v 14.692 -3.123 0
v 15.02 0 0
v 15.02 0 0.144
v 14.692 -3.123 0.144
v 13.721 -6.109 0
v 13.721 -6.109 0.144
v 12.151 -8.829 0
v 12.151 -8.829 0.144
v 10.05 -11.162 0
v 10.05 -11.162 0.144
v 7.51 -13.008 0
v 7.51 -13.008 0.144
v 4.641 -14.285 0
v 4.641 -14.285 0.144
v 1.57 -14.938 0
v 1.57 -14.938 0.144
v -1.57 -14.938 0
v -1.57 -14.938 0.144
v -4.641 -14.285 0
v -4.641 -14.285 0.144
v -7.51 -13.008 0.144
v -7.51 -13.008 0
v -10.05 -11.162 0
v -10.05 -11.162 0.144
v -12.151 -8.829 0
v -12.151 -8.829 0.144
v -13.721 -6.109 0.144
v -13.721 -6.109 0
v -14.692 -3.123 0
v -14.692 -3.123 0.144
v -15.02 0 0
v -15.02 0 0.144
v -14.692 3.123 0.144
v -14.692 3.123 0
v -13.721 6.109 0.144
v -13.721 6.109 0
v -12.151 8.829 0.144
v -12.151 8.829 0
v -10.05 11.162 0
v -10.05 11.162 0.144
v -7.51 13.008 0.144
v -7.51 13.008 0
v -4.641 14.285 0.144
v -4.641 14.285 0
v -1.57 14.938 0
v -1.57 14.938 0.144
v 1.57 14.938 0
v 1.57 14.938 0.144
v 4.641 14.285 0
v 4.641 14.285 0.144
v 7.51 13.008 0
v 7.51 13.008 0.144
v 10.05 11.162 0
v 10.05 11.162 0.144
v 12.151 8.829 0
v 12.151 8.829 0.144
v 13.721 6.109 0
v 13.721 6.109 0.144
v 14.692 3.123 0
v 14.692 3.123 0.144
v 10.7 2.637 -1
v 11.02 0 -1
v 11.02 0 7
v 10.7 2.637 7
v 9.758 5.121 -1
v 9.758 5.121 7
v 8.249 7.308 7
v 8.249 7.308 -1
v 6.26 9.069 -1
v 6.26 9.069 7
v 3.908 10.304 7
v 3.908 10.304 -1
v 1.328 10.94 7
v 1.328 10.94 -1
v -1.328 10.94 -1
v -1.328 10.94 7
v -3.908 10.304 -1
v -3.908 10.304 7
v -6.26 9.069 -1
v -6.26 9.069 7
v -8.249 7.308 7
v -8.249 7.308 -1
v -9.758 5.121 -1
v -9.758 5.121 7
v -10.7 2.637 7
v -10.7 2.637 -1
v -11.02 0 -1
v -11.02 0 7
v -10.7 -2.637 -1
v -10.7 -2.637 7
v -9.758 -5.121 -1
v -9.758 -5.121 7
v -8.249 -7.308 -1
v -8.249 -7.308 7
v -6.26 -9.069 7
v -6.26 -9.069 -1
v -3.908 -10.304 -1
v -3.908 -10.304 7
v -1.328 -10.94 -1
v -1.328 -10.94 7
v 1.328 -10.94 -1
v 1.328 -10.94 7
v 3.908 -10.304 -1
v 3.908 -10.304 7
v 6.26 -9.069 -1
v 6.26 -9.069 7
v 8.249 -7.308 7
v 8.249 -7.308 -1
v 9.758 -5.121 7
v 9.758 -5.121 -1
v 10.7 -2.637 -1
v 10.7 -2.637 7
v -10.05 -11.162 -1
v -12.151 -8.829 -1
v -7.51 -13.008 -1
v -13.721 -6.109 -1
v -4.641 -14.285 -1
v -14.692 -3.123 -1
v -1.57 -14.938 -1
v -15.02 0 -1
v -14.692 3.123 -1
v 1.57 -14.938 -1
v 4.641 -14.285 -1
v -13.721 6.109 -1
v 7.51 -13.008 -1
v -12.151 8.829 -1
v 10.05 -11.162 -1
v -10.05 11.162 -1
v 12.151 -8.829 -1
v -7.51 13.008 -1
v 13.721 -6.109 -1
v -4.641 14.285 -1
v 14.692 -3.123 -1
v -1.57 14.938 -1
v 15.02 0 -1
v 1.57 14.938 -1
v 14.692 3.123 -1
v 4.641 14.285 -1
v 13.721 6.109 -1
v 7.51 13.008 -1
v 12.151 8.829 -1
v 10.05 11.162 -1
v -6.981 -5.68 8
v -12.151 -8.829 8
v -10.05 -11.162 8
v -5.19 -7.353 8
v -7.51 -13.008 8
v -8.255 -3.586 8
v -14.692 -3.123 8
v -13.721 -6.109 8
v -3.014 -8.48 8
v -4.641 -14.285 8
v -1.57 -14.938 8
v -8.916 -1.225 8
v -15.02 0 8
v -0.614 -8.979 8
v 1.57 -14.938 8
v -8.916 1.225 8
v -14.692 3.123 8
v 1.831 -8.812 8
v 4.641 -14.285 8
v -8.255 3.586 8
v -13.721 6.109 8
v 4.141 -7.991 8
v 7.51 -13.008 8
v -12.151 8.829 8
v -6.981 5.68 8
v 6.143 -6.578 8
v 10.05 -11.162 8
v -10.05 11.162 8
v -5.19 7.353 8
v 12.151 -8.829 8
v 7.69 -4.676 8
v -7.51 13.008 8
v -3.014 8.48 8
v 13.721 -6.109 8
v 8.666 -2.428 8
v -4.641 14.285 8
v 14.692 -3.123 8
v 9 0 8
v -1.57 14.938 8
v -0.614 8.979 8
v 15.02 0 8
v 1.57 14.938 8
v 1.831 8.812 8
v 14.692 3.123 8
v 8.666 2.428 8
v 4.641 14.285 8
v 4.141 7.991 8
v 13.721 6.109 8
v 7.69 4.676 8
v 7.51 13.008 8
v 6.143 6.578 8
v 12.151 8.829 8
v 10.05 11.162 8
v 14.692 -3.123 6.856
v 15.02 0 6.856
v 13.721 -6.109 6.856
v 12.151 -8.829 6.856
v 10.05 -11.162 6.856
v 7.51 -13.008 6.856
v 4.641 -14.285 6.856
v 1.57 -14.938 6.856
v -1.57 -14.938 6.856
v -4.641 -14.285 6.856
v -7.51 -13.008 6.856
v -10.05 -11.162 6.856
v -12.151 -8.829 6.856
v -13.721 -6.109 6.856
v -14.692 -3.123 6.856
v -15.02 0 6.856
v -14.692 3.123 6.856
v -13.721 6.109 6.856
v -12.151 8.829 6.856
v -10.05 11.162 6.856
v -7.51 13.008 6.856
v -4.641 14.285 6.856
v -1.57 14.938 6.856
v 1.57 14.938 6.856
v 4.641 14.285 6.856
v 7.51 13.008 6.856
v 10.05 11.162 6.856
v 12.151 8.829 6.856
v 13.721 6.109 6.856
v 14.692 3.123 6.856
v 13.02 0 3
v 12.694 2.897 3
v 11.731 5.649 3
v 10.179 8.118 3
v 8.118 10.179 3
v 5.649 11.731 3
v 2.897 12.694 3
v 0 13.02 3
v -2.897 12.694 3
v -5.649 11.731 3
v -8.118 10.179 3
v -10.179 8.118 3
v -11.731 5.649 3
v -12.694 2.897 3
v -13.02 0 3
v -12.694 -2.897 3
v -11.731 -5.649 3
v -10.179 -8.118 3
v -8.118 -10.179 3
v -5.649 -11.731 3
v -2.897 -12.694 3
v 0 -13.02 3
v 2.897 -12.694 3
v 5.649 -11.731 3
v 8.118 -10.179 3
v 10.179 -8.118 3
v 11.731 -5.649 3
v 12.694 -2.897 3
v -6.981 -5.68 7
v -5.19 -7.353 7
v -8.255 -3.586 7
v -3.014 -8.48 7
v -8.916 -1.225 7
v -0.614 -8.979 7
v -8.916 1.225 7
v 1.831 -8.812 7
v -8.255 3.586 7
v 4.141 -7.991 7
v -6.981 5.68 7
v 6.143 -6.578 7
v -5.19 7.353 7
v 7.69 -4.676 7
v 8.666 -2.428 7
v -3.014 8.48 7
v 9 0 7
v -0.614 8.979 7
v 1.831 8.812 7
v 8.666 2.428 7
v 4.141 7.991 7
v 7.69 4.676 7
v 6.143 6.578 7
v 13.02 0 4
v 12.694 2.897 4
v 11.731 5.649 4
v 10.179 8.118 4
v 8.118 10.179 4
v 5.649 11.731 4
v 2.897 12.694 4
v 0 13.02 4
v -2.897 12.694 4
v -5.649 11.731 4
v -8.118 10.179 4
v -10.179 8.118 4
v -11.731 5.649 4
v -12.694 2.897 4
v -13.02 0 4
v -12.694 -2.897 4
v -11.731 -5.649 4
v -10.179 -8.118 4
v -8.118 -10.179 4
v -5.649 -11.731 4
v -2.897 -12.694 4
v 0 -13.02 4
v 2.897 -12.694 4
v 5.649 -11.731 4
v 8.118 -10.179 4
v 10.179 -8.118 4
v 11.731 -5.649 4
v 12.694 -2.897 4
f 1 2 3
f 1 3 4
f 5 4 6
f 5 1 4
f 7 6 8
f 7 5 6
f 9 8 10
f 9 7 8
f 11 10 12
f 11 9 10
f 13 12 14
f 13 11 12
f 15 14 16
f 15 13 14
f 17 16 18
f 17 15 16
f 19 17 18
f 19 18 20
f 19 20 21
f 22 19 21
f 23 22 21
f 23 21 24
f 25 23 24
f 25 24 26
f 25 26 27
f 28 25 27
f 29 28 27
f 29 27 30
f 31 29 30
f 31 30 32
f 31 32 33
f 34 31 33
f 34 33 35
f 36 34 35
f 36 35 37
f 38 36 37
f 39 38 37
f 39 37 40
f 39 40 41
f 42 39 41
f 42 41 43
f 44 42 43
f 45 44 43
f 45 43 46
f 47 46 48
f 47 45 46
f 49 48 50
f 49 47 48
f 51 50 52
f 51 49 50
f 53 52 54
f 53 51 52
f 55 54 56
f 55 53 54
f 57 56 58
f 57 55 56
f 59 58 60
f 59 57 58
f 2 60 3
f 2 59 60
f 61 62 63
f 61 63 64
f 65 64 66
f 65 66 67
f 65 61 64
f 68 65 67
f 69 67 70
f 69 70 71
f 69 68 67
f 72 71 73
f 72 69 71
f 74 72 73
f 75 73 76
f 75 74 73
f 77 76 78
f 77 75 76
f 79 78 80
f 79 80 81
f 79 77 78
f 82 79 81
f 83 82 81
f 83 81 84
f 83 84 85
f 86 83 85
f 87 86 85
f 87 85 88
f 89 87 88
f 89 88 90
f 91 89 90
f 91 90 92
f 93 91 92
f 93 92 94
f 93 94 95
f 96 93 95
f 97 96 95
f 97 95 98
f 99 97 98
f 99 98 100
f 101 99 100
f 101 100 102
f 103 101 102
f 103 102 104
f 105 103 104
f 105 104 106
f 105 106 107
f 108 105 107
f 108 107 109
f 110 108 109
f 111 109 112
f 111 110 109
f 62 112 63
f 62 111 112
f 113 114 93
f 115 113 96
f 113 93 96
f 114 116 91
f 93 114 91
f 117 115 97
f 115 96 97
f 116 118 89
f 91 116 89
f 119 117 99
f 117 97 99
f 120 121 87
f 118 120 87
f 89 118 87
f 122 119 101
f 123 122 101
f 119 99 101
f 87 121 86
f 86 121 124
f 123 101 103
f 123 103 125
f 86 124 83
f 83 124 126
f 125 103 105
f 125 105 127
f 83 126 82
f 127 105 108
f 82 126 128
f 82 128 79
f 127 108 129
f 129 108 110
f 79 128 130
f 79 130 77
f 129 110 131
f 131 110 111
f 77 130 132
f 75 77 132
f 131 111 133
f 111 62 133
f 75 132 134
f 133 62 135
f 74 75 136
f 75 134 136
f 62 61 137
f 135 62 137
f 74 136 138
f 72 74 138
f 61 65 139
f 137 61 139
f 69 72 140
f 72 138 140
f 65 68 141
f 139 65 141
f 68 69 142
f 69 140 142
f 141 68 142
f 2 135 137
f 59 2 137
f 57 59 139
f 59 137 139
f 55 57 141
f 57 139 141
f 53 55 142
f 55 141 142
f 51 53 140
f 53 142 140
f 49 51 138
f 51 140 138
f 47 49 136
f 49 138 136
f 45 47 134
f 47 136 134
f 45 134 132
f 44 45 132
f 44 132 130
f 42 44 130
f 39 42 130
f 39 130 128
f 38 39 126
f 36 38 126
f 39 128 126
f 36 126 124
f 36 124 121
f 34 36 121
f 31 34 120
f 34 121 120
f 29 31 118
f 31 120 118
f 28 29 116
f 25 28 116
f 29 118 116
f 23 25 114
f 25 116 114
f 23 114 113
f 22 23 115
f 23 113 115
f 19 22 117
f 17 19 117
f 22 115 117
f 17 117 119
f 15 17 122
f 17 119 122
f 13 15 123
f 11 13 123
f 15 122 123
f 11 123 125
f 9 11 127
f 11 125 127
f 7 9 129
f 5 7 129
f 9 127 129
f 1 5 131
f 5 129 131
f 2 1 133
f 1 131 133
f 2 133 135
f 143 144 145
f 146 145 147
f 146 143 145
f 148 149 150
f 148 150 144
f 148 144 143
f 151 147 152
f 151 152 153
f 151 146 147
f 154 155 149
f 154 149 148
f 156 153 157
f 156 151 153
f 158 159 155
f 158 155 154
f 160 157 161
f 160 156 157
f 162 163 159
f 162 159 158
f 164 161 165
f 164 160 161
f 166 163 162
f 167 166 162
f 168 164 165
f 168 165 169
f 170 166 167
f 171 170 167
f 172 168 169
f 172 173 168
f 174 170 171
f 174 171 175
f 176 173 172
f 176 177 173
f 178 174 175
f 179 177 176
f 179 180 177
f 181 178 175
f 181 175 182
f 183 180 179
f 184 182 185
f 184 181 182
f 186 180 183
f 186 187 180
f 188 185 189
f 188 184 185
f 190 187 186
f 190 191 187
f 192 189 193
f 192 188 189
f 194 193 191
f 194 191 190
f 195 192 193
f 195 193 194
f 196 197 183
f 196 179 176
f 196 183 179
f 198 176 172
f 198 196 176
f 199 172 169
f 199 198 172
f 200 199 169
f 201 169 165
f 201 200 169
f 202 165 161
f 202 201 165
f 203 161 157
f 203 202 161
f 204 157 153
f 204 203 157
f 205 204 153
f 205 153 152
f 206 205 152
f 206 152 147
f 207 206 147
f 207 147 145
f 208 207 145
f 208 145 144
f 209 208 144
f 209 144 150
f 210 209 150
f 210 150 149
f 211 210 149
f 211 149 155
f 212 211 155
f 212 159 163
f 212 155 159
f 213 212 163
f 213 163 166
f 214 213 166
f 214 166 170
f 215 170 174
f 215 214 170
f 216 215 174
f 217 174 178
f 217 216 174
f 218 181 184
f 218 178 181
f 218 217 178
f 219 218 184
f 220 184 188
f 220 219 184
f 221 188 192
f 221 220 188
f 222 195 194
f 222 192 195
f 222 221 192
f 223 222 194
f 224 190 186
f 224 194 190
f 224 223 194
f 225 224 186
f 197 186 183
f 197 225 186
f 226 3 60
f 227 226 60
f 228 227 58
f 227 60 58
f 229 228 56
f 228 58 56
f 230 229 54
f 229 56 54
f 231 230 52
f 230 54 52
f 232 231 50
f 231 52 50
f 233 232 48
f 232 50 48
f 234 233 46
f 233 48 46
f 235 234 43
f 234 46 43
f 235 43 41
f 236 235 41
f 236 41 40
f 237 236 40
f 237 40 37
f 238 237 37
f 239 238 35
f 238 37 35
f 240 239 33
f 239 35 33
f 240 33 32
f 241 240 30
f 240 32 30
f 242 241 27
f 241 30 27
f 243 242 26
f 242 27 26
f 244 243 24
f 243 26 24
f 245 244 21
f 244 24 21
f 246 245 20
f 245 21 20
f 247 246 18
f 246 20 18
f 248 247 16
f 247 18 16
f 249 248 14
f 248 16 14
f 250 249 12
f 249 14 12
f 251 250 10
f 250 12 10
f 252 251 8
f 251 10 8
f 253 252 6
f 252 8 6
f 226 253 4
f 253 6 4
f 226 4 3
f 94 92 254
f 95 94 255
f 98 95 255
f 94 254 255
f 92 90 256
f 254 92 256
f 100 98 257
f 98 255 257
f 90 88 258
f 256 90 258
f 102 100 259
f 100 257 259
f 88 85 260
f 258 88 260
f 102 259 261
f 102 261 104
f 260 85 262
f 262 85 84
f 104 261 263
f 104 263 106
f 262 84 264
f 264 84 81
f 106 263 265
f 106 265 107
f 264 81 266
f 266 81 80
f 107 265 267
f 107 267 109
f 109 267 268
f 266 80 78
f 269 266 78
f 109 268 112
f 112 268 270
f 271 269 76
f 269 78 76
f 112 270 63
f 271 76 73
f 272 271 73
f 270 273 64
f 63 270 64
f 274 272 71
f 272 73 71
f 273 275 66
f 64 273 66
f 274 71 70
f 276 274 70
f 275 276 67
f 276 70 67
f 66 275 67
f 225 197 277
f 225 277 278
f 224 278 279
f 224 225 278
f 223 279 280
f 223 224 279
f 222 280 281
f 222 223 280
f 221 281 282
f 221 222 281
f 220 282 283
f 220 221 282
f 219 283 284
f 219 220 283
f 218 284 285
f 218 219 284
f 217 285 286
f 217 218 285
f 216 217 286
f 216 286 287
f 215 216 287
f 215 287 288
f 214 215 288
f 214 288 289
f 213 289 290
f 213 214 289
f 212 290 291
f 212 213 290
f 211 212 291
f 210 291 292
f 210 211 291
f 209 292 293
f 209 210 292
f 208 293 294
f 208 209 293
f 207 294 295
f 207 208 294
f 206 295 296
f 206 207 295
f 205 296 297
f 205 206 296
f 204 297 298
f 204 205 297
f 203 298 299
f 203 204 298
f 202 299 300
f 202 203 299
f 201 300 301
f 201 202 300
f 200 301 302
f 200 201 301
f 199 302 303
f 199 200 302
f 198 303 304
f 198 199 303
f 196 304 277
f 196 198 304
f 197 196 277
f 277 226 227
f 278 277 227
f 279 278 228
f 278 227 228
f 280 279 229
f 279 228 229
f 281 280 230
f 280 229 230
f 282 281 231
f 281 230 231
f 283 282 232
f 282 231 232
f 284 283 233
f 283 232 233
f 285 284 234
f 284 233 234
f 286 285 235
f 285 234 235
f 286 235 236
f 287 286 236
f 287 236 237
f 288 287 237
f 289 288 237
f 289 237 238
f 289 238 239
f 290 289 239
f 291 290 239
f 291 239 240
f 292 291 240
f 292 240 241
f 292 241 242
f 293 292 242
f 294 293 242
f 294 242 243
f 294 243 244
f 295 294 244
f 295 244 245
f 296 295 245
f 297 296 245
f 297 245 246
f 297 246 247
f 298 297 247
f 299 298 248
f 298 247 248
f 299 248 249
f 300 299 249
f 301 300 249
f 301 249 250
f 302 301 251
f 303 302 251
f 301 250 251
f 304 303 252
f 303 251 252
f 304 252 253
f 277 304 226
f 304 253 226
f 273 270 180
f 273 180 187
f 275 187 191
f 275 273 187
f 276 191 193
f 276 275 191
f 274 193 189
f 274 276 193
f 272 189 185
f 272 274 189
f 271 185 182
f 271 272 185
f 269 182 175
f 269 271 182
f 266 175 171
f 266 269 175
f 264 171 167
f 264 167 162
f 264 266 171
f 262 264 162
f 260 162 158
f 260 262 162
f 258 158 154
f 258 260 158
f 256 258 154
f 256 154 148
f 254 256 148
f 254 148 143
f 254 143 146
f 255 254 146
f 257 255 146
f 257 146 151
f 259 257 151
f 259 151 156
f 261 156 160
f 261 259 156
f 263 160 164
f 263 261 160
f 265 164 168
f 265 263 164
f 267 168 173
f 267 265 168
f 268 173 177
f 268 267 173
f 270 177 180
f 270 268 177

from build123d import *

# Parameters (mm, degrees)
SKETCH2_R               = 13.02
SKETCH2_R_2             = 11.02
BOSS_EXTRUDE1_DEPTH     = 7
SKETCH3_R               = 15.02
SKETCH3_R_2             = 13.02
SKETCH3_R_3             = 11.02
SKETCH3_R_4             = 9
BOSS_EXTRUDE2_DEPTH     = 1
SALIENTE_EXTRUIR1_START = -8
SKETCH3_2_R             = 15.02
SKETCH3_2_R_2           = 13.02
SKETCH3_2_R_3           = 11.02
SALIENTE_EXTRUIR1_DEPTH = 1
CHAFL_N1_SIZE           = 3
CHAFL_N1_SIZE_2         = 2.100622615
CHAMFER1_SIZE           = 3
CHAMFER1_SIZE_2         = 2.100622615


with BuildPart() as part:
    # Sketch2 → Boss-Extrude1 (new body)
    with BuildSketch(Plane.XY):
        Circle(SKETCH2_R)
        Circle(SKETCH2_R_2, mode=Mode.SUBTRACT)
    extrude(amount=BOSS_EXTRUDE1_DEPTH)

    # Sketch3 → Boss-Extrude2 (add)
    # profile 1 of 3: a face of its own
    with BuildSketch(Plane.XY.offset(7)):
        Circle(SKETCH3_R)
        Circle(SKETCH3_R_2, mode=Mode.SUBTRACT)
    # profile 2 of 3: a face of its own
    with BuildSketch(Plane.XY.offset(7)):
        Circle(SKETCH3_R_2)
        Circle(SKETCH3_R_3, mode=Mode.SUBTRACT)
    # profile 3 of 3: a face of its own
    with BuildSketch(Plane.XY.offset(7)):
        Circle(SKETCH3_R_3)
        Circle(SKETCH3_R_4, mode=Mode.SUBTRACT)
    extrude(amount=BOSS_EXTRUDE2_DEPTH)

    # Sketch3<2> → Saliente-Extruir1 (add)
    # profile 1 of 2: a face of its own
    with BuildSketch(Plane.XY.offset(7).offset(SALIENTE_EXTRUIR1_START)):
        Circle(SKETCH3_2_R)
        Circle(SKETCH3_2_R_2, mode=Mode.SUBTRACT)
    # profile 2 of 2: a face of its own
    with BuildSketch(Plane.XY.offset(7).offset(SALIENTE_EXTRUIR1_START)):
        Circle(SKETCH3_2_R_2)
        Circle(SKETCH3_2_R_3, mode=Mode.SUBTRACT)
    extrude(amount=SALIENTE_EXTRUIR1_DEPTH)

    # Chaflán1
    # the kernel refuses this chamfer: 3, 2.100622615 mm, written as the material it adds along each edge
    with BuildSketch(Plane(origin=(0, 0, 7), x_dir=(1, 0, 0), z_dir=(0, -1, 0))) as chafl_n1_piece_1_section:
        Polygon((13.02, -CHAFL_N1_SIZE), (13.02 + CHAFL_N1_SIZE_2, 0), (13.02, 0), align=None)
    chafl_n1_piece_1 = revolve(axis=Axis((0, 0, 7), (0, 0, 1)), mode=Mode.PRIVATE)
    chafl_n1_piece_1 = chafl_n1_piece_1 & Plane(origin=(0, 0, 5.417457175), x_dir=(1, 0, 0), z_dir=(0, 0, -1)) * Cylinder(15.02, 61, mode=Mode.PRIVATE)
    add(chafl_n1_piece_1)

    # Chamfer1
    # the kernel refuses this chamfer: 3, 2.100622615 mm, written as the material it adds along each edge
    with BuildSketch(Plane(origin=(0, 0, 0), x_dir=(1, 0, 0), z_dir=(0, -1, 0))) as chamfer1_piece_1_section:
        Polygon((13.02, CHAMFER1_SIZE), (13.02 + CHAMFER1_SIZE_2, 0), (13.02, 0), align=None)
    chamfer1_piece_1 = revolve(axis=Axis((0, 0, 0), (0, 0, 1)), mode=Mode.PRIVATE)
    chamfer1_piece_1 = chamfer1_piece_1 & Plane(origin=(0, 0, 1.582542825), x_dir=(1, 0, 0), z_dir=(0, 0, -1)) * Cylinder(15.02, 61, mode=Mode.PRIVATE)
    add(chamfer1_piece_1)


solid = part.part
